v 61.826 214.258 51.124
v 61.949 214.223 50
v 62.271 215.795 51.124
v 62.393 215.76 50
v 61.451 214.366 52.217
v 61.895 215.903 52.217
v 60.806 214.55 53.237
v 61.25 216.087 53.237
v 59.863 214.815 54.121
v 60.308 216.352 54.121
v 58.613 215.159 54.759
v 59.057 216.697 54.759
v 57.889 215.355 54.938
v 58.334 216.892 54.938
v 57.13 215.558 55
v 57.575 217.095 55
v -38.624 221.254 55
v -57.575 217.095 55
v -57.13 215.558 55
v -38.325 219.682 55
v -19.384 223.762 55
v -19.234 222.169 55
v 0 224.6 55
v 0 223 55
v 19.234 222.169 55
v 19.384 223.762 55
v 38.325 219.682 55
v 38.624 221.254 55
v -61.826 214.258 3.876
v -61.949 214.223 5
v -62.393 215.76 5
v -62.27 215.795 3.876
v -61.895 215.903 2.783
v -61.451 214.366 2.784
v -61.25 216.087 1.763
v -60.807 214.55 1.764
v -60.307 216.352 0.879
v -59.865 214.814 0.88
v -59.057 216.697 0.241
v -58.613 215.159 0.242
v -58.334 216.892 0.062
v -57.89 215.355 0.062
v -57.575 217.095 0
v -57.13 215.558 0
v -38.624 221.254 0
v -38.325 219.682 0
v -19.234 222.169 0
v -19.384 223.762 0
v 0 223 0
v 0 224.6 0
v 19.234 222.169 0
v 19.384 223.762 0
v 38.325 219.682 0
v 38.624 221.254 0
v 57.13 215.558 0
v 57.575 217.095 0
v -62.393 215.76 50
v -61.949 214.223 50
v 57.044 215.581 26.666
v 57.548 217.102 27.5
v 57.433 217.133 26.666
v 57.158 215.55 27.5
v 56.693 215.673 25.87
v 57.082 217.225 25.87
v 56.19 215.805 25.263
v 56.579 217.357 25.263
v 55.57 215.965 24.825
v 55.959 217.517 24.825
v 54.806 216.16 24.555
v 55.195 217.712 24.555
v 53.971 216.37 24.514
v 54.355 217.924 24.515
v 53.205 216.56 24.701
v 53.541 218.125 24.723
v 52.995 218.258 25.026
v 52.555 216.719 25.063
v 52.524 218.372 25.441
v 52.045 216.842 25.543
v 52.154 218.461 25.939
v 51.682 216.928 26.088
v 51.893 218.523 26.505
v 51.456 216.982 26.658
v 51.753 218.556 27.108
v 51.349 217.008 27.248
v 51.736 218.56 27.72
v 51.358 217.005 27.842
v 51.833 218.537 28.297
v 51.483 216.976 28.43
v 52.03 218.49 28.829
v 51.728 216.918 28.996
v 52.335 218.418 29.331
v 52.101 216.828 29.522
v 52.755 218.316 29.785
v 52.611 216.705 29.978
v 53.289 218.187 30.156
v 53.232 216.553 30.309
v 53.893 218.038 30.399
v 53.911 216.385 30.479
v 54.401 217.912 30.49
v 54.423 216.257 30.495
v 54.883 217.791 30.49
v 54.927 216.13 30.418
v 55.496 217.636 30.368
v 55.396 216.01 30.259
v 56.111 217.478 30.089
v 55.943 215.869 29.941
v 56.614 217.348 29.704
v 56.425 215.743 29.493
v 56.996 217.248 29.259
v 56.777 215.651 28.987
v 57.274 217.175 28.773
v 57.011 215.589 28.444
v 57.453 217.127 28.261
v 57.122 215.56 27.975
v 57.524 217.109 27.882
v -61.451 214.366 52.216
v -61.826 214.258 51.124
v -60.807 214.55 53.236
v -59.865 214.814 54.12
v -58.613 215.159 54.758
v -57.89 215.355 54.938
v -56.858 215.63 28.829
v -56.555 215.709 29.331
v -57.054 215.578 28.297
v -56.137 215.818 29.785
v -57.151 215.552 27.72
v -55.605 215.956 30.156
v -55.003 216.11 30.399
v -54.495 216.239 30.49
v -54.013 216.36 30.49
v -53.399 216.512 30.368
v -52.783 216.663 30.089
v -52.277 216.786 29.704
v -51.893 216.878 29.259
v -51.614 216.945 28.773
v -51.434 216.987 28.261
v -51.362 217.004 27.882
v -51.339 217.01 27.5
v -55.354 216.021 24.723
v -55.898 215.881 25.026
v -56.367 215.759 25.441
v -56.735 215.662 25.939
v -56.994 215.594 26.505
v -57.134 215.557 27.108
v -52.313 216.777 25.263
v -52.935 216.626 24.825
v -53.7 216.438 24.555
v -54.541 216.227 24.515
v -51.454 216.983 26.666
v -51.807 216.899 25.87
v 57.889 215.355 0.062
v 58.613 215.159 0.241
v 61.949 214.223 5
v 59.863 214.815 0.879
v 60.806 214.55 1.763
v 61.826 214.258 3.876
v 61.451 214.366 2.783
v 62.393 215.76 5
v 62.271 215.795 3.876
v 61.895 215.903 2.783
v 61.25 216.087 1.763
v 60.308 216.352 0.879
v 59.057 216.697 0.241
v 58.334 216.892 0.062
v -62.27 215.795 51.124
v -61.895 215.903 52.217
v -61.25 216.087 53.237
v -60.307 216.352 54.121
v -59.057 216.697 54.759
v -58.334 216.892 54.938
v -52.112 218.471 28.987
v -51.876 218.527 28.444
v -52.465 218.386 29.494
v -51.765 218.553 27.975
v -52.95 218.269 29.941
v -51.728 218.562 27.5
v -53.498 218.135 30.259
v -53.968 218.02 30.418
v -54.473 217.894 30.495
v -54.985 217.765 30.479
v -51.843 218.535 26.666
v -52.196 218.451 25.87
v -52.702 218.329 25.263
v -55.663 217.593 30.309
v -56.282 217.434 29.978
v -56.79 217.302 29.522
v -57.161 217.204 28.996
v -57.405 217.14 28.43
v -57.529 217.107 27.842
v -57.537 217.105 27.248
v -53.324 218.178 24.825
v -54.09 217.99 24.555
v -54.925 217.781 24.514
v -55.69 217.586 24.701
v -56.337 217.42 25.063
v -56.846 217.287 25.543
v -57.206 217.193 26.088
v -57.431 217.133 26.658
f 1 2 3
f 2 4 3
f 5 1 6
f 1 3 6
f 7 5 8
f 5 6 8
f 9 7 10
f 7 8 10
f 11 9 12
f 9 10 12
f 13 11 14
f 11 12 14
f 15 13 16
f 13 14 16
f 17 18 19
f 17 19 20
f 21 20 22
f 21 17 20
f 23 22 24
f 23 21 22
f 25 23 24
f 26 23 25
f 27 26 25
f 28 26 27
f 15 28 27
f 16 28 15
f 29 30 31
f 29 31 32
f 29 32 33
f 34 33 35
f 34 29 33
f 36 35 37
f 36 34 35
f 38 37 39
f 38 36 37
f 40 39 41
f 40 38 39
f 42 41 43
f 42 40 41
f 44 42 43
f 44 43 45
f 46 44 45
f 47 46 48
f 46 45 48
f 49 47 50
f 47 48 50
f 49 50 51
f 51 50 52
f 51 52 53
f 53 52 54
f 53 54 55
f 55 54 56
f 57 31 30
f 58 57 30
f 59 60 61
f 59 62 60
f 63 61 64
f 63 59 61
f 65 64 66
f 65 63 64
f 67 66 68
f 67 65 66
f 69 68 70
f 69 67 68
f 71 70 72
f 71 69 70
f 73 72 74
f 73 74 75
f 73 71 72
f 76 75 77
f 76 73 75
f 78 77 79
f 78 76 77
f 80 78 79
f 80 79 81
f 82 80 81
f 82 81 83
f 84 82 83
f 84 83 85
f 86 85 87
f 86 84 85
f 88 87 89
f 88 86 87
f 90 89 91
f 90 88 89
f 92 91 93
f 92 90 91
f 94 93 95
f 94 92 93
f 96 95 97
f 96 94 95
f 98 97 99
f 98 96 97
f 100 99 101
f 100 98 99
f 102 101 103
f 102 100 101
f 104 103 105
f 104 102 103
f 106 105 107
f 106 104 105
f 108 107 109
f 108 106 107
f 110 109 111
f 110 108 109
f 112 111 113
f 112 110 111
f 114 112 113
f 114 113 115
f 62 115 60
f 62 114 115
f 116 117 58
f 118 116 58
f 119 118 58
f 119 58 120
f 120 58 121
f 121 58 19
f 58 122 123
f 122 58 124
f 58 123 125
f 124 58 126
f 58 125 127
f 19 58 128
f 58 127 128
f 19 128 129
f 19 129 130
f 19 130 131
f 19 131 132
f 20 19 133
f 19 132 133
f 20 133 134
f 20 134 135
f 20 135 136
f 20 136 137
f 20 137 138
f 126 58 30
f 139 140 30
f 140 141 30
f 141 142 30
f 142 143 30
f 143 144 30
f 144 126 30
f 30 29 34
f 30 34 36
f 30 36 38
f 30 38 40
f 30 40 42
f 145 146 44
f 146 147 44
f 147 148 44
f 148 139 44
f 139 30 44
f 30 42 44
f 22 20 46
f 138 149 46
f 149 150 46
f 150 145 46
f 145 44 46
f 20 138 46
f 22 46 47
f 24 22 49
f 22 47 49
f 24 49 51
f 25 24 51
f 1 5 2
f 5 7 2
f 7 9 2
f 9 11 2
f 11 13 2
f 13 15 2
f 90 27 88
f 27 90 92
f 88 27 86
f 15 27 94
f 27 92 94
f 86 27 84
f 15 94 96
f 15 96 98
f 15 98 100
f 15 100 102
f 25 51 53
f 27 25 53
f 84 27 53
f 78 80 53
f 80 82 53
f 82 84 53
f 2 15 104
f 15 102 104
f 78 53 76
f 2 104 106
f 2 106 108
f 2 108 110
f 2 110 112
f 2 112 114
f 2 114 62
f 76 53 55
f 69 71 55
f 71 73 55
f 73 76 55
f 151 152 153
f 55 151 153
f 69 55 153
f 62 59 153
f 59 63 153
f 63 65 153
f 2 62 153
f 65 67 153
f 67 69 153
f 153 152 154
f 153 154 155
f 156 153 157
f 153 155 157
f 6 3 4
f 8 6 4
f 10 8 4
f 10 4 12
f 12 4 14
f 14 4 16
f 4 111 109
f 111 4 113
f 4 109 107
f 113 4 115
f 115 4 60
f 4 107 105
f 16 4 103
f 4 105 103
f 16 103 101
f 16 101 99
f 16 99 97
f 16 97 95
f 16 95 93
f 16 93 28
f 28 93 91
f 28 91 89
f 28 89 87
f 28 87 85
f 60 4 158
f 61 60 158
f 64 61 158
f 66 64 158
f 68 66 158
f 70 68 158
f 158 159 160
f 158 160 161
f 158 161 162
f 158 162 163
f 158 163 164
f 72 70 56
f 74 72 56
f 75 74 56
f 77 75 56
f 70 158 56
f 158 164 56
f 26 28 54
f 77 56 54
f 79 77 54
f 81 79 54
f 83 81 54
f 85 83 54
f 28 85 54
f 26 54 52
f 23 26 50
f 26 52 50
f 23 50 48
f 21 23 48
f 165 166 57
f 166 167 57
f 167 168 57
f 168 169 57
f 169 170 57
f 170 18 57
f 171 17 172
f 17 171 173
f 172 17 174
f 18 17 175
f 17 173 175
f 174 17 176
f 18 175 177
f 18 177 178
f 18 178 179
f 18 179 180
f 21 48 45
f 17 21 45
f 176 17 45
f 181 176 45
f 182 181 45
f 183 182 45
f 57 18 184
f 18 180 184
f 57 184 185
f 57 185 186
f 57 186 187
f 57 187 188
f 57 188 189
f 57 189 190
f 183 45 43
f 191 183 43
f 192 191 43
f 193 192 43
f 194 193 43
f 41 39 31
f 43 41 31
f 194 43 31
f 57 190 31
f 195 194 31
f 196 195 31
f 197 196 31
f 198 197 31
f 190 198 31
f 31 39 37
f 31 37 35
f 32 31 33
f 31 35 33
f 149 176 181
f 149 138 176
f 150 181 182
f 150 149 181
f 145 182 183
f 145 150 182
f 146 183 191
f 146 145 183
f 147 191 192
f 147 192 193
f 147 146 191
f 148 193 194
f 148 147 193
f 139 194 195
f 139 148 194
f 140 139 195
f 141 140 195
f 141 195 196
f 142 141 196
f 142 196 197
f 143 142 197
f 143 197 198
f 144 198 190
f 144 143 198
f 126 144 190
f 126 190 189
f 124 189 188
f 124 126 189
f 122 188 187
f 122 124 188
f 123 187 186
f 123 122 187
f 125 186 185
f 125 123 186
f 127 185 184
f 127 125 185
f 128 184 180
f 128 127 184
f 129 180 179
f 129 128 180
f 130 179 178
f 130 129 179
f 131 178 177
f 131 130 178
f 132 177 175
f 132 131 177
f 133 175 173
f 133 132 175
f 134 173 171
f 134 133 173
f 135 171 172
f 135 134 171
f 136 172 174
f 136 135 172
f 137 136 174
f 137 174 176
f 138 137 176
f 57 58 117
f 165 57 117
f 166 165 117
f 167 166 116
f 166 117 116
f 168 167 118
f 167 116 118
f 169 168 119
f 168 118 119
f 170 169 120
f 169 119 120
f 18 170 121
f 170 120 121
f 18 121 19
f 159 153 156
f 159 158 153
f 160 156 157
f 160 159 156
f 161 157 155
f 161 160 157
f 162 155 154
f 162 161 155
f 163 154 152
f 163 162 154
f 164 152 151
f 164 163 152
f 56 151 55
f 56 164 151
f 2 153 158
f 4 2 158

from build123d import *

# Parameters (mm, degrees)
EXTRUDE_1_DEPTH = 55
FILLET_1_R      = 5


with BuildPart() as part:
    # ｽｹｯﾁ1 → ﾎﾞｽ - 押し出し1 (new body)
    with BuildSketch(Plane.XY):
        with BuildLine():
            Line((61.949000384, 214.222597667), (62.393477517, 215.75962079))
            ThreePointArc((62.393477517, 215.75962079), (0, 224.6), (-62.393477517, 215.75962079))
            Line((-62.393477517, 215.75962079), (-61.949000384, 214.222597667))
            ThreePointArc((-61.949000384, 214.222597667), (0, 223), (61.949000384, 214.222597667))
        make_face()
    extrude(amount=EXTRUDE_1_DEPTH)

    # ﾌｨﾚｯﾄ1
    fillet_1_edges = [part.edges().sort_by_distance(p)[0] for p in [
        (-62.171238951, 214.991109229, 55),
        (-62.171238951, 214.991109229, 0),
        (62.171238951, 214.991109229, 0),
        (62.171238951, 214.991109229, 55),
    ]]
    fillet(fillet_1_edges, radius=FILLET_1_R)

    # ｽｹｯﾁ2 → ｶｯﾄ - 回転1 (revolve, cut)
    with BuildSketch(Plane.XY.offset(27.5), mode=Mode.PRIVATE) as cut_revolve_1_sk:
        Polygon((51.528577079, 205.436232793), (57.367509326, 228.715126027), (54.457647672, 229.444992558), (48.618715425, 206.166099324), align=None)
    revolve(cut_revolve_1_sk.sketch.rotate(Axis((51.528577079, 205.436232793, 27.5), (0.24328884362241038, 0.9699538847640492, 0)), 180), axis=Axis((51.528577079, 205.436232793, 27.5), (0.24328884362241038, 0.9699538847640492, 0)), mode=Mode.SUBTRACT)

    # ｽｹｯﾁ3 → ｶｯﾄ - 回転2 (revolve, cut)
    with BuildSketch(Plane.XY.offset(27.5), mode=Mode.PRIVATE) as cut_revolve_2_sk:
        Polygon((-51.528577079, 205.436232793), (-57.367509326, 228.715126027), (-60.27737098, 227.985259496), (-54.438438734, 204.706366262), align=None)
    revolve(cut_revolve_2_sk.sketch.rotate(Axis((-51.528577079, 205.436232793, 27.5), (-0.24328884362241038, 0.9699538847640492, 0)), 180), axis=Axis((-51.528577079, 205.436232793, 27.5), (-0.24328884362241038, 0.9699538847640492, 0)), mode=Mode.SUBTRACT)


solid = part.part
